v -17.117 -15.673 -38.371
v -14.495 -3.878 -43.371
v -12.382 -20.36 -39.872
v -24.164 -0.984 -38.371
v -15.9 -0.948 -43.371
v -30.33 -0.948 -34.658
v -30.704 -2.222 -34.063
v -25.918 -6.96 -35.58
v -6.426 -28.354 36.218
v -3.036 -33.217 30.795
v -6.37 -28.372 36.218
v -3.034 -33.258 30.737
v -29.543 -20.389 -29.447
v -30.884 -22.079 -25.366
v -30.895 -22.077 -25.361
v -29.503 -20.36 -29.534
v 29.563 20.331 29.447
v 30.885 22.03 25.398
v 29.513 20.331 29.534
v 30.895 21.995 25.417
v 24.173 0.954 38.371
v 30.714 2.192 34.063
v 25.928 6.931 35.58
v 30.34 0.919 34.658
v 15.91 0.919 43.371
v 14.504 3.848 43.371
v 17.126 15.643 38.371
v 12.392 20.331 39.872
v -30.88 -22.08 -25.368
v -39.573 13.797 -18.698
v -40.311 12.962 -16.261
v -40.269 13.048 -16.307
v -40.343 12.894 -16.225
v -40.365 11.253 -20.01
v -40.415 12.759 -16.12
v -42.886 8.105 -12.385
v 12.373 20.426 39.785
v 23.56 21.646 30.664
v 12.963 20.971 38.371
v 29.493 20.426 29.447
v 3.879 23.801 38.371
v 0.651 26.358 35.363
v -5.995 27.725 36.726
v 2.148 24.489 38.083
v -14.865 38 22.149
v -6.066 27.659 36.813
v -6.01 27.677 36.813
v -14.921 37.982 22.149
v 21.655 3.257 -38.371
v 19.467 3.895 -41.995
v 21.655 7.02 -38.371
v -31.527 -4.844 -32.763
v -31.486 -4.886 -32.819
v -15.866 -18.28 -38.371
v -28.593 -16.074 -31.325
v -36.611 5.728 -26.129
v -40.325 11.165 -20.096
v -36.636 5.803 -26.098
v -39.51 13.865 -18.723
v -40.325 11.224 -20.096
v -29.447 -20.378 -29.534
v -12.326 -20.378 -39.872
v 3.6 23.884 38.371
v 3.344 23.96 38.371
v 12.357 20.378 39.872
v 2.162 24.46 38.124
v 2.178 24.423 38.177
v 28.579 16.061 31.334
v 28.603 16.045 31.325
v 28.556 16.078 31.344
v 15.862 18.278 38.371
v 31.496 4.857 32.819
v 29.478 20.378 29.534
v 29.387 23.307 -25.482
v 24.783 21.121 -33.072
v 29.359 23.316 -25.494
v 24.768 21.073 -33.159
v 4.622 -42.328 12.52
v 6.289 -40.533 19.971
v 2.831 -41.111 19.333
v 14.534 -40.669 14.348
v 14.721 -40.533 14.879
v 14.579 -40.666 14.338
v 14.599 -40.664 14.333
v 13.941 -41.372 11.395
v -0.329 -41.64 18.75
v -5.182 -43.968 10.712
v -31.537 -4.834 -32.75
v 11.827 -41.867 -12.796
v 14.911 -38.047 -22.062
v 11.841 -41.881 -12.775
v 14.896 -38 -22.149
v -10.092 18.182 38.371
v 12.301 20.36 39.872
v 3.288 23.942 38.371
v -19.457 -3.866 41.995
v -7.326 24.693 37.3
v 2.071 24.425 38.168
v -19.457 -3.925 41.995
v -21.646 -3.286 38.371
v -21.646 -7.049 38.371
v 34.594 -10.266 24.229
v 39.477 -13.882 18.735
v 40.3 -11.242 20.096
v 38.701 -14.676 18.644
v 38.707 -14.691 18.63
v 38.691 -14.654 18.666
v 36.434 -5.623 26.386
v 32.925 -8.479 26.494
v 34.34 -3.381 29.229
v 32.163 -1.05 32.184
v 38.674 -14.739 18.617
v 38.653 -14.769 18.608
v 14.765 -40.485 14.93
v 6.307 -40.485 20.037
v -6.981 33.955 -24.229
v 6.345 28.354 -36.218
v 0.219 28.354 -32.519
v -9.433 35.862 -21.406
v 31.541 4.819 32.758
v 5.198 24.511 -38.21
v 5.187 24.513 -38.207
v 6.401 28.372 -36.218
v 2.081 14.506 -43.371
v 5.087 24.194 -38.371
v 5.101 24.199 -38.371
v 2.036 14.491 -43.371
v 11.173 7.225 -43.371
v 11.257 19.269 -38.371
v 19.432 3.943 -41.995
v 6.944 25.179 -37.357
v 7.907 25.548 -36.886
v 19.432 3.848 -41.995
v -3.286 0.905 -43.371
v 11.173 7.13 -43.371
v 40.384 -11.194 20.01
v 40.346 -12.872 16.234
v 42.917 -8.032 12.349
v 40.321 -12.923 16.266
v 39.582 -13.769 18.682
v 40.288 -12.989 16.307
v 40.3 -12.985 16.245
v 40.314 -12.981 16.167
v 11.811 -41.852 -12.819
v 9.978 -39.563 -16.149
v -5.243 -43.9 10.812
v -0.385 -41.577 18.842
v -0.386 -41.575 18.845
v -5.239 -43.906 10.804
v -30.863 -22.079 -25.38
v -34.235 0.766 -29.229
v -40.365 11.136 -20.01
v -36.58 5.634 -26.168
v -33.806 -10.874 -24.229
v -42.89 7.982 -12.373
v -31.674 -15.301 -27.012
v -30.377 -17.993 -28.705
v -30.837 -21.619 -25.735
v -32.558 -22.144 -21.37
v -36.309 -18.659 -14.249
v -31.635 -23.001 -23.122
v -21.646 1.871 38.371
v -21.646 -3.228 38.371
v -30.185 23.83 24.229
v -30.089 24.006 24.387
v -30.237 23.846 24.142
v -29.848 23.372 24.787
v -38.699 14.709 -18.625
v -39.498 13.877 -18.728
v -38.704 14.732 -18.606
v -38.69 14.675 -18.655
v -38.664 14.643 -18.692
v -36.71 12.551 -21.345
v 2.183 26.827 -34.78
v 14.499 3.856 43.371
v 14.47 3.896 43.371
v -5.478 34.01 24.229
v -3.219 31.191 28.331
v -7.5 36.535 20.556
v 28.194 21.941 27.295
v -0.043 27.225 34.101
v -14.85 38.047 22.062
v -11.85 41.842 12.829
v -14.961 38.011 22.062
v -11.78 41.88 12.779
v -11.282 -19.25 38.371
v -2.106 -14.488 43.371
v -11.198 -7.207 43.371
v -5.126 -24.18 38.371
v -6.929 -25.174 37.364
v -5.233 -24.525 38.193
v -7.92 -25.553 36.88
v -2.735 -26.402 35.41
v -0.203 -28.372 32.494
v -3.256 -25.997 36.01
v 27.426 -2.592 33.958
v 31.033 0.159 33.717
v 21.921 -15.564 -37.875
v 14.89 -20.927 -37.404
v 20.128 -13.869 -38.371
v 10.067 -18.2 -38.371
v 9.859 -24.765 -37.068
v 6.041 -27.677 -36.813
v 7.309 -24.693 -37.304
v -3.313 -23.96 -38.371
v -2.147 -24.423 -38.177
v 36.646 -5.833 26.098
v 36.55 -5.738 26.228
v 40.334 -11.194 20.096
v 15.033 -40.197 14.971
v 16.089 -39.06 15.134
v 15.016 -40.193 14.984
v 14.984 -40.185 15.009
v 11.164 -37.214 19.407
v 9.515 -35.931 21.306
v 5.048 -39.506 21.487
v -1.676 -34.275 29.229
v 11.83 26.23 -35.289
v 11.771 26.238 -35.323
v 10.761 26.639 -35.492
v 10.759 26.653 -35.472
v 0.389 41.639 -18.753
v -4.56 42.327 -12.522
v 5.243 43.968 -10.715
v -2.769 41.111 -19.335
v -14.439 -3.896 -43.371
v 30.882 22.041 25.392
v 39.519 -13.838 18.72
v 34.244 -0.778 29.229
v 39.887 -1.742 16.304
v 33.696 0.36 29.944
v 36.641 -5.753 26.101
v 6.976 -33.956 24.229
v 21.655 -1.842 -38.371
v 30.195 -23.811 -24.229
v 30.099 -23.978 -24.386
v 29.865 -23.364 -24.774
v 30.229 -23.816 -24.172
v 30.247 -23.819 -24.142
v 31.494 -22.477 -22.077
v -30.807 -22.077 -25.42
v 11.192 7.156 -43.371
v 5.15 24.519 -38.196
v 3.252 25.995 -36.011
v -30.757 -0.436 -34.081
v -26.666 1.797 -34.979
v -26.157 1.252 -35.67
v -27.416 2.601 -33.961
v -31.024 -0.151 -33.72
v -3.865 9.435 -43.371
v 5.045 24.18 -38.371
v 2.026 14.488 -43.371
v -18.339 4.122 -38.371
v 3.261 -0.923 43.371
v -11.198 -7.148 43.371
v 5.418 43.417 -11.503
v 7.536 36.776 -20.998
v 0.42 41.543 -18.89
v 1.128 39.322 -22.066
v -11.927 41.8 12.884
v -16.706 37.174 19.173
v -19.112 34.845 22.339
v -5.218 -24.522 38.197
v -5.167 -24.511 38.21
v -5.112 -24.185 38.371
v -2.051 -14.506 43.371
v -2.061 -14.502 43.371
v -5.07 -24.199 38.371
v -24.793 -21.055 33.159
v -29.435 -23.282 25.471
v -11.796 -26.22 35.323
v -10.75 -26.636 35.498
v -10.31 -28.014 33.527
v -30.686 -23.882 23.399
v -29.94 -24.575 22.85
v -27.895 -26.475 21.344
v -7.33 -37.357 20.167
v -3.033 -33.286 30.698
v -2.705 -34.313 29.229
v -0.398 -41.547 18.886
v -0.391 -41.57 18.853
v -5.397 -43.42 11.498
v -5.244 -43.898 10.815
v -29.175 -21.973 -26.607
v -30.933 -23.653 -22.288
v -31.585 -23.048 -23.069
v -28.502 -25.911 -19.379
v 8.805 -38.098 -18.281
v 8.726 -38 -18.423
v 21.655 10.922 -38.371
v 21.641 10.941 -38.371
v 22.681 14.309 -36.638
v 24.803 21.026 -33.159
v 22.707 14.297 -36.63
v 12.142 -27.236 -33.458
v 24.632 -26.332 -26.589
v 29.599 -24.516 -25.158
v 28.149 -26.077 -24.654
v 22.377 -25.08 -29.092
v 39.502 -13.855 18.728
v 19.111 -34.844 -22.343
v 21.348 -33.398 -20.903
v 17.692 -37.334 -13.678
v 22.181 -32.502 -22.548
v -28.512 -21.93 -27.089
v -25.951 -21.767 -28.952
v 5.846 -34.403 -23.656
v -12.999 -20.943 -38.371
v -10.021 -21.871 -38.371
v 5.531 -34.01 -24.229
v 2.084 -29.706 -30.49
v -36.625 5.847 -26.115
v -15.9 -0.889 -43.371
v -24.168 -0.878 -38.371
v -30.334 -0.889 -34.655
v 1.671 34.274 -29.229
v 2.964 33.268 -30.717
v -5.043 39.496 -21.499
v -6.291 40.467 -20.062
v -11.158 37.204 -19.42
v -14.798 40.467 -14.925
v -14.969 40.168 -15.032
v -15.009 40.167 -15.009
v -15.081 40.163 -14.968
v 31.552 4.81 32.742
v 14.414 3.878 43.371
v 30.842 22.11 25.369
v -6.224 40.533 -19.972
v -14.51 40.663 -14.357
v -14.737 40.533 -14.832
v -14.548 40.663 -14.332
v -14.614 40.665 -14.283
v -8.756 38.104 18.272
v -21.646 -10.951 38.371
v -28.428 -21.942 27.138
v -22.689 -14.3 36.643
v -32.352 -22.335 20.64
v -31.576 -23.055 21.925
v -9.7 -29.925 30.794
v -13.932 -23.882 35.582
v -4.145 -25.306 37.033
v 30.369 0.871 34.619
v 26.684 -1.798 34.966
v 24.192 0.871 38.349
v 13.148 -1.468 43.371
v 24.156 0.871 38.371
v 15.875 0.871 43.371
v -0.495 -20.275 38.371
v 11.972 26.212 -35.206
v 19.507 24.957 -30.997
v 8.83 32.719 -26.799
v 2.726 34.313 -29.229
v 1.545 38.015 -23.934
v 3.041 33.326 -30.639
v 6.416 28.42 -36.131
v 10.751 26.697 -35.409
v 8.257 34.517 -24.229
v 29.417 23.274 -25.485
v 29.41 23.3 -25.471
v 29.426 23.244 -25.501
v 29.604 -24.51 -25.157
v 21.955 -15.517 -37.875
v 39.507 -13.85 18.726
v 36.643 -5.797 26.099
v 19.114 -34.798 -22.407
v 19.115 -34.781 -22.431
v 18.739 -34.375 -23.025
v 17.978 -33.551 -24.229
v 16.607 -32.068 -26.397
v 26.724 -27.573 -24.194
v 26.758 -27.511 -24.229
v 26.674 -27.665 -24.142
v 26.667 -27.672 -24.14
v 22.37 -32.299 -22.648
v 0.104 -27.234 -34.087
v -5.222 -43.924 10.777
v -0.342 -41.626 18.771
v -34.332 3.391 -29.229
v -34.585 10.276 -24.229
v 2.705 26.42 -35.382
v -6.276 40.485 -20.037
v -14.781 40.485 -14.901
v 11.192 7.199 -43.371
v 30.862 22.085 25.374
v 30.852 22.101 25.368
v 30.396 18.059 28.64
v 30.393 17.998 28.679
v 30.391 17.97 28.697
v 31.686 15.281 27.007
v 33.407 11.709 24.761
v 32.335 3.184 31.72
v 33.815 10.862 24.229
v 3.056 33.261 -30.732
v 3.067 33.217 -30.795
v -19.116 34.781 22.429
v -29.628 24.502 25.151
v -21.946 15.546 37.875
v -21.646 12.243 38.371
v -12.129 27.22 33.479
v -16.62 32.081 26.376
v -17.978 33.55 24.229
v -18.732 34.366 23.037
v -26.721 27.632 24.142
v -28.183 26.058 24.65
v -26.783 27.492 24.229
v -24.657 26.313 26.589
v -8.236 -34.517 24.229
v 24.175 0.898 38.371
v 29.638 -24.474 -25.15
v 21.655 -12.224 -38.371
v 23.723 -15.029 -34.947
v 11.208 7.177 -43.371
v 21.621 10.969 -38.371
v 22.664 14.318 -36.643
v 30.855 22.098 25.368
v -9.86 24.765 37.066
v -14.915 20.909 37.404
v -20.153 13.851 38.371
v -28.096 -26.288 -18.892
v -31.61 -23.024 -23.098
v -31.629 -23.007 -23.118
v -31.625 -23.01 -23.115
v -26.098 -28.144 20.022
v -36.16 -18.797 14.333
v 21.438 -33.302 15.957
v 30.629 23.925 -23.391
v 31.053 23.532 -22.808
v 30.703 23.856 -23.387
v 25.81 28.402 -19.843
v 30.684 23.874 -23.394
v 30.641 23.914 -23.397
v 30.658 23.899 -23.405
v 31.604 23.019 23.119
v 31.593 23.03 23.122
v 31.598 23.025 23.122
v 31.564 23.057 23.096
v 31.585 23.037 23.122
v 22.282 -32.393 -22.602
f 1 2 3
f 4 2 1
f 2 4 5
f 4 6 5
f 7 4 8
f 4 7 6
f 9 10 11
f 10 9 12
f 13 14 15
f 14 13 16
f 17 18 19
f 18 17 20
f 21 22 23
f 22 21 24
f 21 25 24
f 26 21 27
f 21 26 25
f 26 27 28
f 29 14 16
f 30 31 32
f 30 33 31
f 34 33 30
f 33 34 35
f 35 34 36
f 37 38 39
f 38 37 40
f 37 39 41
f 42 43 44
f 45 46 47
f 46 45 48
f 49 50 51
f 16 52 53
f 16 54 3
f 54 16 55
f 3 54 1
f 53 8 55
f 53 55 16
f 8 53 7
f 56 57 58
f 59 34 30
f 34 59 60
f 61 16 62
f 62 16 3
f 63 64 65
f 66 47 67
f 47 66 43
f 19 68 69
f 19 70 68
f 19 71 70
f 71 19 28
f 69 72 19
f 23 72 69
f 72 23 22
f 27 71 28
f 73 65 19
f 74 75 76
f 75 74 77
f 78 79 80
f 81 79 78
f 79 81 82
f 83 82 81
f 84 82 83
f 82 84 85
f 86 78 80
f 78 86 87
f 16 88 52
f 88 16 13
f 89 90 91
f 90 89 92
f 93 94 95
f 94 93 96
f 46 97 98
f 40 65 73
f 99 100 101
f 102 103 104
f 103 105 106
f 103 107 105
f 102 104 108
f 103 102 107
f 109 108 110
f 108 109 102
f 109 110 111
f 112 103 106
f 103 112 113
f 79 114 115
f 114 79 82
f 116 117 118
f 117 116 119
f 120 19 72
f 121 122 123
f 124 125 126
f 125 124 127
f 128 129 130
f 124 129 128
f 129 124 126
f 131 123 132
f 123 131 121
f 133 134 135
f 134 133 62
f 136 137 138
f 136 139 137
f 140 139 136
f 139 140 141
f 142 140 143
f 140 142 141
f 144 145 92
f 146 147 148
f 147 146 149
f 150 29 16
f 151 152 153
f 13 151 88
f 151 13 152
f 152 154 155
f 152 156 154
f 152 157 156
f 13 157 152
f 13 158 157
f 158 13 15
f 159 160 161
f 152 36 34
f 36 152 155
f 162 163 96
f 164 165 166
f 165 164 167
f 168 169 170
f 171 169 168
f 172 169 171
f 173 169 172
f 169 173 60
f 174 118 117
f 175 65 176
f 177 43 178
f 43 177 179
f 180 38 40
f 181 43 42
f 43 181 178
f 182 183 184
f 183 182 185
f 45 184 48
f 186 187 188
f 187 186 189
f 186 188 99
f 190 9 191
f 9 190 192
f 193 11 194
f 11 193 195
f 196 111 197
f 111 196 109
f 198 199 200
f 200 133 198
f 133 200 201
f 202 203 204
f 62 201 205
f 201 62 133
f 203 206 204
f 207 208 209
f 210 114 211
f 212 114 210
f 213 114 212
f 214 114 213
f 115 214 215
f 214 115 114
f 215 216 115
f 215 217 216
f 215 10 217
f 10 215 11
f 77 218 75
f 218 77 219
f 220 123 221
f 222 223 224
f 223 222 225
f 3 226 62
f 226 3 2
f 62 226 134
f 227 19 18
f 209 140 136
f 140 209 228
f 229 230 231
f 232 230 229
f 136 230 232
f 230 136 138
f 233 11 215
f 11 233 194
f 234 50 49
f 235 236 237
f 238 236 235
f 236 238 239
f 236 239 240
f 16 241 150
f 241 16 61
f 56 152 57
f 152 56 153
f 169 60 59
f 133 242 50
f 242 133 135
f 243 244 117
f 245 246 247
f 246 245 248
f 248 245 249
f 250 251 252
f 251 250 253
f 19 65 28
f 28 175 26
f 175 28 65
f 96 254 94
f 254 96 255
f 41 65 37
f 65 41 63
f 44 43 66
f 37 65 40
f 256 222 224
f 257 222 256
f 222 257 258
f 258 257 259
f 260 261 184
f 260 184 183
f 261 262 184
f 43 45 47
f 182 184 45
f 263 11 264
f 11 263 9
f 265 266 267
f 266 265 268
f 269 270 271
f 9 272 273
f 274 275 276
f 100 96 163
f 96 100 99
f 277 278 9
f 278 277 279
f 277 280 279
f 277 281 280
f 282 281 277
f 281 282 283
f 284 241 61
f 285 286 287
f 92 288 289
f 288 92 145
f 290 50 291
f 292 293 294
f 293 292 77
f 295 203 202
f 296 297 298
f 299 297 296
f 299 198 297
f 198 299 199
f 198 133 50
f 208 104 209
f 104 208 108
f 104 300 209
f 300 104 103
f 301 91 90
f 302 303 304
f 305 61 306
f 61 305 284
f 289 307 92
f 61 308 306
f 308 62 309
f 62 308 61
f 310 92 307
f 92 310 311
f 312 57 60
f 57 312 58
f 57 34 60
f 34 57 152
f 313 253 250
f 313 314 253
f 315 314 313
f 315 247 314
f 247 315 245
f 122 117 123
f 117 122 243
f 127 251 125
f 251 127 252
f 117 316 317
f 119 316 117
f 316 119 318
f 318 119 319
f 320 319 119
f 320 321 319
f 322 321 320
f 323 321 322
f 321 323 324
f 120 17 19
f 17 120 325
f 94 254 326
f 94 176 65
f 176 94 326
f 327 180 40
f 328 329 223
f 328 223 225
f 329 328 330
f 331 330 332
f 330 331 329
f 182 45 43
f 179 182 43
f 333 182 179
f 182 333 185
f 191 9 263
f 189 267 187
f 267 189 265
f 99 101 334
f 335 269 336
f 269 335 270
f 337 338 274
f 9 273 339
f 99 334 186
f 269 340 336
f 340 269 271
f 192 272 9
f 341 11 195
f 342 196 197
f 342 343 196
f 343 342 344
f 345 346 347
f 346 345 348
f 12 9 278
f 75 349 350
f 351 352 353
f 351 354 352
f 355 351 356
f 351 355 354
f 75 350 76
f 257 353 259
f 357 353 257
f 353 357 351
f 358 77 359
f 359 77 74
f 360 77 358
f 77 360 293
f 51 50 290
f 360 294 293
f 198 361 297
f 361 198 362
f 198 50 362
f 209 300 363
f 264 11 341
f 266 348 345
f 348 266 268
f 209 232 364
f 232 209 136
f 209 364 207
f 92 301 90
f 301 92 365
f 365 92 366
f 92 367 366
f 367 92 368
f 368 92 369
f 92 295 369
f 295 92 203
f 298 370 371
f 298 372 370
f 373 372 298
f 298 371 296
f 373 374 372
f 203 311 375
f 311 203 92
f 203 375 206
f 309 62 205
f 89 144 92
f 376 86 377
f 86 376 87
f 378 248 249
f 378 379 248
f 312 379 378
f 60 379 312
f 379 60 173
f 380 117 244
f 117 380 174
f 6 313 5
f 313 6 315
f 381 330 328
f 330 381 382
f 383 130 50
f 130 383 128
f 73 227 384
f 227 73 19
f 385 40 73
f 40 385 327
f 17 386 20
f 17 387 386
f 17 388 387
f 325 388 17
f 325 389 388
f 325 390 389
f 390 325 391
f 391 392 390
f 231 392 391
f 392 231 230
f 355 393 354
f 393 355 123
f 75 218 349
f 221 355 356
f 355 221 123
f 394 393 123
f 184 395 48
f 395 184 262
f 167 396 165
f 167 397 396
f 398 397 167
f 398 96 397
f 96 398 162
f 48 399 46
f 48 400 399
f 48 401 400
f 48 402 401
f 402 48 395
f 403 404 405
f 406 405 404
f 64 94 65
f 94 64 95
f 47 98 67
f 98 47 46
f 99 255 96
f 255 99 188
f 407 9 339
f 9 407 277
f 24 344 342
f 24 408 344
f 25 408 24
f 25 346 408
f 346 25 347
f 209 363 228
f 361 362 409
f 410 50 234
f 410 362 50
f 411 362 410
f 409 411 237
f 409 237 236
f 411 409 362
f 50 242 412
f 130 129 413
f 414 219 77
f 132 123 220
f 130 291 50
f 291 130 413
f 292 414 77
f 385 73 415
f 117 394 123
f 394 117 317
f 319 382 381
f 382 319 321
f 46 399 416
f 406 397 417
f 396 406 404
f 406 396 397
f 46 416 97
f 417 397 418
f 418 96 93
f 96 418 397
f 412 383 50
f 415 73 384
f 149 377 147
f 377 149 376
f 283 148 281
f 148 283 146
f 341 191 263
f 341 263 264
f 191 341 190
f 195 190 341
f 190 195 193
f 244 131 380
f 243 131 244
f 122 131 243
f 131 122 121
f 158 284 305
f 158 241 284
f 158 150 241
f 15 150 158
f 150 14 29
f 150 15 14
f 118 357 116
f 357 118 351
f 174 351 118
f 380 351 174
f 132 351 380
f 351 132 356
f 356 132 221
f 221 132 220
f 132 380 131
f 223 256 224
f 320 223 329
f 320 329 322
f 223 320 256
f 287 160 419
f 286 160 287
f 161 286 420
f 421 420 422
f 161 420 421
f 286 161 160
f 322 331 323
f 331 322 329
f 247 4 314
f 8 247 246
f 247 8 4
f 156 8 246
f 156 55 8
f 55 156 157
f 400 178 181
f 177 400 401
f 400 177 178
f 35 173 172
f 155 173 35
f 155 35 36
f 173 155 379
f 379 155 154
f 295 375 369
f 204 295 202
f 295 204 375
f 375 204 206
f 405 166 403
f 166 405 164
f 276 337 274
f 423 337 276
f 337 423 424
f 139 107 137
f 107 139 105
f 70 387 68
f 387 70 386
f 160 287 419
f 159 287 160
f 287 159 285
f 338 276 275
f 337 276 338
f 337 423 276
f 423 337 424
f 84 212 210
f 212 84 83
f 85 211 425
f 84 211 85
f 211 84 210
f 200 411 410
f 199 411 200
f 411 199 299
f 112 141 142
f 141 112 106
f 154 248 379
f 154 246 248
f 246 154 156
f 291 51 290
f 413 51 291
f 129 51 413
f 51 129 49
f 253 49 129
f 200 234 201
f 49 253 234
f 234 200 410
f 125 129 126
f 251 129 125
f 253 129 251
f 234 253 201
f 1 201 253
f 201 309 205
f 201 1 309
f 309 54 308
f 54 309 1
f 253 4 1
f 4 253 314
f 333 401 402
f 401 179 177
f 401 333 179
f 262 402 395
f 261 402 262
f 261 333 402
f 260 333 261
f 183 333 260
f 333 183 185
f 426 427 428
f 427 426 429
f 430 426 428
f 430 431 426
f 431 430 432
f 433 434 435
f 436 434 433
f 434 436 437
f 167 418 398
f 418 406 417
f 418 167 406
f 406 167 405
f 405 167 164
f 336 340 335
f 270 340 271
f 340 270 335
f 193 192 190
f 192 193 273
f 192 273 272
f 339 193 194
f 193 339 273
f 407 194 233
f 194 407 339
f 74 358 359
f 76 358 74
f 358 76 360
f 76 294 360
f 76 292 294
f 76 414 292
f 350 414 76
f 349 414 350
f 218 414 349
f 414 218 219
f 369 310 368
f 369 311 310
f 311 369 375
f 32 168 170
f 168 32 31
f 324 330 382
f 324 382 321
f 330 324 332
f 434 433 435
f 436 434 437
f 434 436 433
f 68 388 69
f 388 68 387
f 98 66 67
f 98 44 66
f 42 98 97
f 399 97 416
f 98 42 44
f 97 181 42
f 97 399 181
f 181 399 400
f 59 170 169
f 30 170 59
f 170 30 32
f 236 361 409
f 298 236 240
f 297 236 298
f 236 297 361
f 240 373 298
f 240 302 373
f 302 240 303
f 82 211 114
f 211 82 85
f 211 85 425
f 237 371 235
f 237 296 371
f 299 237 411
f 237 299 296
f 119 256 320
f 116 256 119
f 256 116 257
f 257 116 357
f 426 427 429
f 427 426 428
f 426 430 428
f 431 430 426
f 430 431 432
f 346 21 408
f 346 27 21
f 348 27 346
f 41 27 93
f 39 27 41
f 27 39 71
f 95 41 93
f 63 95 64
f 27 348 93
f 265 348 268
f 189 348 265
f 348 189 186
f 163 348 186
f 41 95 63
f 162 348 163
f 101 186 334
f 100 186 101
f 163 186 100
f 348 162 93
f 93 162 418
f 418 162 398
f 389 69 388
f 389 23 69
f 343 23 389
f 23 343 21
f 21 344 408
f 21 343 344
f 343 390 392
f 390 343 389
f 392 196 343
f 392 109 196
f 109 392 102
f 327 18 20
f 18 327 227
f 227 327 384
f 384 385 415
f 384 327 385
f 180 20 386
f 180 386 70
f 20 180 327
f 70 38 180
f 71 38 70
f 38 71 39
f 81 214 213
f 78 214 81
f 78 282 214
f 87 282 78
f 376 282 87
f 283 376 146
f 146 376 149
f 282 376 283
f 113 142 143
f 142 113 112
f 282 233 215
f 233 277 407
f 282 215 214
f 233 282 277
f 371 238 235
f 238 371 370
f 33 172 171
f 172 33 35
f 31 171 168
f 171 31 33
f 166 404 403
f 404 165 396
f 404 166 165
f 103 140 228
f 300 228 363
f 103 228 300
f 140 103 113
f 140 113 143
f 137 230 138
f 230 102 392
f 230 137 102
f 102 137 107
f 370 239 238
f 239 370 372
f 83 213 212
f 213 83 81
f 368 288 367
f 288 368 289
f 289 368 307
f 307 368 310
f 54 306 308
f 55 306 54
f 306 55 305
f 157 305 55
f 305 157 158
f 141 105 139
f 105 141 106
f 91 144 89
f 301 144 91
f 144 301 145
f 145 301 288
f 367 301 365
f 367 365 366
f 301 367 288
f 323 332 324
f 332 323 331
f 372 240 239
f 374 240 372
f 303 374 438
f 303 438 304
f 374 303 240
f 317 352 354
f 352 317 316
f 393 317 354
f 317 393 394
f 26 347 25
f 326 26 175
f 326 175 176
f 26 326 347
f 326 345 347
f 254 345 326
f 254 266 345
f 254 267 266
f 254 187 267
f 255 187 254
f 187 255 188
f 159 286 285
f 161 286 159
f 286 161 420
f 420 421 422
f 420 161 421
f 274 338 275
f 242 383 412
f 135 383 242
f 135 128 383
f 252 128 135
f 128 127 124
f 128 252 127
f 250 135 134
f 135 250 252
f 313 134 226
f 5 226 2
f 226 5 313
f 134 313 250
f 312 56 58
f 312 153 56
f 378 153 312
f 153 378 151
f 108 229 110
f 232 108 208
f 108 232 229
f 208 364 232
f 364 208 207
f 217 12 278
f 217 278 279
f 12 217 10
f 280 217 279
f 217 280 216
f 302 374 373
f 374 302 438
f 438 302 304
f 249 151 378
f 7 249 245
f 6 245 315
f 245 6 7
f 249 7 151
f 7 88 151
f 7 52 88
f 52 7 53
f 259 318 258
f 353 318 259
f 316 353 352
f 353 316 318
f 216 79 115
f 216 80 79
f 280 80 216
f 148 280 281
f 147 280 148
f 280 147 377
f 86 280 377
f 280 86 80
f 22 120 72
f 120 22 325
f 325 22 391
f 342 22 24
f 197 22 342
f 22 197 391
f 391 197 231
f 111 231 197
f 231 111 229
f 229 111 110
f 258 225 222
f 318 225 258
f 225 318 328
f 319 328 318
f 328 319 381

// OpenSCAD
// Auto-generated OpenSCAD file

    shift = 0;

    inner_points = 10*[[1.1618572766031852, -4.374399277962952, 1.000000000000002], [-0.8367864835324492, -4.448041114380123, 1.0000000000000029], [2.124358238462418, -3.3382564796865486, 2.414213562373096], [-1.872929281808851, -3.48554015252089, 2.4142135623730976], [1.088215440186016, -2.375755517827316, 3.828427124746191], [-0.9104283199496184, -2.4493973542444865, 3.828427124746192], [1.161857276603184, -4.374399277962953, -0.999999999999998], [-0.8367864835324501, -4.448041114380124, -0.9999999999999971], [3.485540152520892, -1.8729292818088505, 2.4142135623730945], [-3.3382564796865495, -2.124358238462415, 2.4142135623730976], [2.4493973542444905, -0.9104283199496176, 3.82842712474619], [-2.375755517827317, -1.0882154401860122, 3.828427124746192], [4.448041114380124, -0.8367864835324489, 0.9999999999999986], [-4.374399277962953, -1.1618572766031843, 1.0000000000000024], [2.124358238462416, -3.3382564796865517, -2.414213562373094], [-1.8729292818088528, -3.4855401525208927, -2.4142135623730923], [-2.4493973542444873, 0.9104283199496221, 3.8284271247461907], [2.37575551782732, 1.0882154401860165, 3.8284271247461885], [-4.448041114380123, 0.8367864835324504, 1.0000000000000013], [4.374399277962953, 1.1618572766031856, 0.9999999999999974], [-3.4855401525208904, 1.8729292818088532, 2.4142135623730954], [3.3382564796865513, 2.1243582384624182, 2.4142135623730923], [1.088215440186013, -2.3757555178273204, -3.8284271247461894], [-0.9104283199496215, -2.449397354244491, -3.8284271247461885], [-1.161857276603184, 4.374399277962953, 0.999999999999998], [0.8367864835324501, 4.448041114380124, 0.9999999999999971], [-3.485540152520892, 1.8729292818088505, -2.4142135623730945], [3.3382564796865495, 2.124358238462415, -2.4142135623730976], [-2.4493973542444905, 0.9104283199496178, -3.82842712474619], [2.375755517827317, 1.0882154401860122, -3.828427124746192], [-4.448041114380124, 0.8367864835324491, -0.9999999999999986], [4.374399277962953, 1.1618572766031843, -1.0000000000000024], [-2.124358238462416, 3.3382564796865517, 2.414213562373094], [1.8729292818088528, 3.4855401525208927, 2.4142135623730923], [2.4493973542444873, -0.9104283199496219, -3.8284271247461907], [-2.37575551782732, -1.0882154401860165, -3.8284271247461885], [4.448041114380123, -0.8367864835324502, -1.0000000000000013], [-4.374399277962953, -1.1618572766031856, -0.9999999999999974], [3.4855401525208904, -1.8729292818088532, -2.4142135623730954], [-3.3382564796865513, -2.1243582384624182, -2.4142135623730923], [-1.088215440186013, 2.3757555178273204, 3.8284271247461894], [0.9104283199496215, 2.449397354244491, 3.8284271247461885], [-1.1618572766031852, 4.374399277962952, -1.000000000000002], [0.8367864835324492, 4.448041114380123, -1.0000000000000029], [-2.124358238462418, 3.3382564796865486, -2.414213562373096], [1.872929281808851, 3.48554015252089, -2.4142135623730976], [-1.088215440186016, 2.375755517827316, -3.828427124746191], [0.9104283199496184, 2.4493973542444865, -3.828427124746192]];

    outer_points_unshifted = 10*[[0.19483699485527917, -4.043756012674625, 2.2572897974412043], [-0.8085685266092445, -4.525134756809608, 0.5955281225342591], [-0.6385051006498914, -2.832464442910386, 3.613134067583294], [-2.6453161435789387, -3.7952219311803512, 0.28961071776940417], [-2.475252717619586, -2.1025516172811294, 3.307216662818439], [-3.4786582390841096, -2.5839303614161118, 1.6454549879114944], [1.9069304548230477, -4.043756012674625, 1.223492919744432], [0.9035249333585239, -4.525134756809608, -0.4382687551625134], [-0.10493533424195078, -1.119439476961603, 4.496790545187316], [-3.530776074186175, -2.762969313825389, -1.1768187027118062], [-1.9416829512116456, -0.3895266513323463, 4.19087314042246], [-4.364118169691346, -1.5516777440611493, 0.17902556743028408], [1.4829883613895745, 0.09185209280263607, 4.39062525015167], [-2.946257900019173, -2.033056488196132, -2.944745672654397], [3.4948541504545725, -2.832464442910386, 1.1173276247087862], [1.4880431075255252, -3.7952219311803512, -2.206195725105104], [-4.612942091029515, 0.3895266513323463, -0.2330571323702164], [-2.1905068725498147, 1.5516777440611493, 3.77879044062196], [-3.1950818213573426, -0.09185209280263607, -3.3568283724548977], [1.234164440051405, 2.033056488196132, 3.9785425503511695], [-4.028423916862513, 1.119439476961603, -2.000984102312808], [-0.6025831769182892, 2.762969313825389, 3.6726251455863146], [4.079372324621574, -2.1025516172811294, -0.6505993452338048], [3.075966803157051, -2.5839303614161118, -2.3123610201407496], [-1.9069304548230477, 4.043756012674625, -1.223492919744432], [-0.9035249333585239, 4.525134756809608, 0.4382687551625134], [0.10493533424195078, 1.119439476961603, -4.496790545187316], [3.530776074186175, 2.762969313825389, 1.1768187027118062], [1.9416829512116456, 0.3895266513323463, -4.19087314042246], [4.364118169691346, 1.5516777440611493, -0.17902556743028408], [-1.4829883613895745, -0.09185209280263607, -4.39062525015167], [2.946257900019173, 2.033056488196132, 2.944745672654397], [-3.4948541504545725, 2.832464442910386, -1.1173276247087862], [-1.4880431075255252, 3.7952219311803512, 2.206195725105104], [4.612942091029515, -0.3895266513323463, 0.2330571323702164], [2.1905068725498147, -1.5516777440611493, -3.77879044062196], [3.1950818213573426, 0.09185209280263607, 3.3568283724548977], [-1.234164440051405, -2.033056488196132, -3.9785425503511695], [4.028423916862513, -1.119439476961603, 2.000984102312808], [0.6025831769182892, -2.762969313825389, -3.6726251455863146], [-4.079372324621574, 2.1025516172811294, 0.6505993452338048], [-3.075966803157051, 2.5839303614161118, 2.3123610201407496], [-0.19483699485527917, 4.043756012674625, -2.2572897974412043], [0.8085685266092445, 4.525134756809608, -0.5955281225342591], [0.6385051006498914, 2.832464442910386, -3.613134067583294], [2.6453161435789387, 3.7952219311803512, -0.28961071776940417], [2.475252717619586, 2.1025516172811294, -3.307216662818439], [3.4786582390841096, 2.5839303614161118, -1.6454549879114944]];
    
    outer_points = [for (p = outer_points_unshifted) [p[0], p[1], p[2] + shift]];

    // Convex hull for inner set (I)
    module inner_hull() {
        hull() {
            for (p = inner_points) {
                translate(p) sphere(r=0.1);
            }
        }
    }

    // Convex hull for outer set (O) minus inner hull (O \ I)
    module outer_minus_inner() {
        difference() {
            hull() {
                for (p = outer_points) {
                    translate(p) sphere(r=0.1);
                }
            }
            inner_hull(); // Subtract inner hull
        }
    }

    // Convex hull for outer set (O) minus all translated inner hulls
    module outer_minus_AllTranslationInner() {
        difference() {
            hull() {
                for (p = outer_points) {
                    translate(p) sphere(r=0.1);
                }
            }
            hull() {
                translate([0,0,5]) inner_hull();
                translate([0,0,-5]) inner_hull();
            }; // Subtract translated inner hulls
        }
    }

    // Difference between outer_minus_inner and outer_minus_AllTranslationInner
    module outer_minus_inner_diff() {
        difference() {
            // Outer minus inner
            difference() {
                hull() {
                    for (p = outer_points) {
                        translate(p) sphere(r=0.1);
                    }
                }
                inner_hull();
            }

            // Subtract Outer minus AllTranslationInner
            difference() {
                hull() {
                    for (p = outer_points) {
                        translate(p) sphere(r=0.1);
                    }
                }
                hull() {
                    translate([0,0,5]) inner_hull();
                    translate([0,0,-5]) inner_hull();
                };
            }
        }
    }

    // Rendering all with colors applied
    // color([1, 0, 0, 0.5]) inner_hull(); // Transparent red
    // color([0, 1, 0, 1]) outer_minus_AllTranslationInner(); // Opaque green
    color([1, 1, 0, 1]) outer_minus_inner_diff(); // Opaque yellow
    
